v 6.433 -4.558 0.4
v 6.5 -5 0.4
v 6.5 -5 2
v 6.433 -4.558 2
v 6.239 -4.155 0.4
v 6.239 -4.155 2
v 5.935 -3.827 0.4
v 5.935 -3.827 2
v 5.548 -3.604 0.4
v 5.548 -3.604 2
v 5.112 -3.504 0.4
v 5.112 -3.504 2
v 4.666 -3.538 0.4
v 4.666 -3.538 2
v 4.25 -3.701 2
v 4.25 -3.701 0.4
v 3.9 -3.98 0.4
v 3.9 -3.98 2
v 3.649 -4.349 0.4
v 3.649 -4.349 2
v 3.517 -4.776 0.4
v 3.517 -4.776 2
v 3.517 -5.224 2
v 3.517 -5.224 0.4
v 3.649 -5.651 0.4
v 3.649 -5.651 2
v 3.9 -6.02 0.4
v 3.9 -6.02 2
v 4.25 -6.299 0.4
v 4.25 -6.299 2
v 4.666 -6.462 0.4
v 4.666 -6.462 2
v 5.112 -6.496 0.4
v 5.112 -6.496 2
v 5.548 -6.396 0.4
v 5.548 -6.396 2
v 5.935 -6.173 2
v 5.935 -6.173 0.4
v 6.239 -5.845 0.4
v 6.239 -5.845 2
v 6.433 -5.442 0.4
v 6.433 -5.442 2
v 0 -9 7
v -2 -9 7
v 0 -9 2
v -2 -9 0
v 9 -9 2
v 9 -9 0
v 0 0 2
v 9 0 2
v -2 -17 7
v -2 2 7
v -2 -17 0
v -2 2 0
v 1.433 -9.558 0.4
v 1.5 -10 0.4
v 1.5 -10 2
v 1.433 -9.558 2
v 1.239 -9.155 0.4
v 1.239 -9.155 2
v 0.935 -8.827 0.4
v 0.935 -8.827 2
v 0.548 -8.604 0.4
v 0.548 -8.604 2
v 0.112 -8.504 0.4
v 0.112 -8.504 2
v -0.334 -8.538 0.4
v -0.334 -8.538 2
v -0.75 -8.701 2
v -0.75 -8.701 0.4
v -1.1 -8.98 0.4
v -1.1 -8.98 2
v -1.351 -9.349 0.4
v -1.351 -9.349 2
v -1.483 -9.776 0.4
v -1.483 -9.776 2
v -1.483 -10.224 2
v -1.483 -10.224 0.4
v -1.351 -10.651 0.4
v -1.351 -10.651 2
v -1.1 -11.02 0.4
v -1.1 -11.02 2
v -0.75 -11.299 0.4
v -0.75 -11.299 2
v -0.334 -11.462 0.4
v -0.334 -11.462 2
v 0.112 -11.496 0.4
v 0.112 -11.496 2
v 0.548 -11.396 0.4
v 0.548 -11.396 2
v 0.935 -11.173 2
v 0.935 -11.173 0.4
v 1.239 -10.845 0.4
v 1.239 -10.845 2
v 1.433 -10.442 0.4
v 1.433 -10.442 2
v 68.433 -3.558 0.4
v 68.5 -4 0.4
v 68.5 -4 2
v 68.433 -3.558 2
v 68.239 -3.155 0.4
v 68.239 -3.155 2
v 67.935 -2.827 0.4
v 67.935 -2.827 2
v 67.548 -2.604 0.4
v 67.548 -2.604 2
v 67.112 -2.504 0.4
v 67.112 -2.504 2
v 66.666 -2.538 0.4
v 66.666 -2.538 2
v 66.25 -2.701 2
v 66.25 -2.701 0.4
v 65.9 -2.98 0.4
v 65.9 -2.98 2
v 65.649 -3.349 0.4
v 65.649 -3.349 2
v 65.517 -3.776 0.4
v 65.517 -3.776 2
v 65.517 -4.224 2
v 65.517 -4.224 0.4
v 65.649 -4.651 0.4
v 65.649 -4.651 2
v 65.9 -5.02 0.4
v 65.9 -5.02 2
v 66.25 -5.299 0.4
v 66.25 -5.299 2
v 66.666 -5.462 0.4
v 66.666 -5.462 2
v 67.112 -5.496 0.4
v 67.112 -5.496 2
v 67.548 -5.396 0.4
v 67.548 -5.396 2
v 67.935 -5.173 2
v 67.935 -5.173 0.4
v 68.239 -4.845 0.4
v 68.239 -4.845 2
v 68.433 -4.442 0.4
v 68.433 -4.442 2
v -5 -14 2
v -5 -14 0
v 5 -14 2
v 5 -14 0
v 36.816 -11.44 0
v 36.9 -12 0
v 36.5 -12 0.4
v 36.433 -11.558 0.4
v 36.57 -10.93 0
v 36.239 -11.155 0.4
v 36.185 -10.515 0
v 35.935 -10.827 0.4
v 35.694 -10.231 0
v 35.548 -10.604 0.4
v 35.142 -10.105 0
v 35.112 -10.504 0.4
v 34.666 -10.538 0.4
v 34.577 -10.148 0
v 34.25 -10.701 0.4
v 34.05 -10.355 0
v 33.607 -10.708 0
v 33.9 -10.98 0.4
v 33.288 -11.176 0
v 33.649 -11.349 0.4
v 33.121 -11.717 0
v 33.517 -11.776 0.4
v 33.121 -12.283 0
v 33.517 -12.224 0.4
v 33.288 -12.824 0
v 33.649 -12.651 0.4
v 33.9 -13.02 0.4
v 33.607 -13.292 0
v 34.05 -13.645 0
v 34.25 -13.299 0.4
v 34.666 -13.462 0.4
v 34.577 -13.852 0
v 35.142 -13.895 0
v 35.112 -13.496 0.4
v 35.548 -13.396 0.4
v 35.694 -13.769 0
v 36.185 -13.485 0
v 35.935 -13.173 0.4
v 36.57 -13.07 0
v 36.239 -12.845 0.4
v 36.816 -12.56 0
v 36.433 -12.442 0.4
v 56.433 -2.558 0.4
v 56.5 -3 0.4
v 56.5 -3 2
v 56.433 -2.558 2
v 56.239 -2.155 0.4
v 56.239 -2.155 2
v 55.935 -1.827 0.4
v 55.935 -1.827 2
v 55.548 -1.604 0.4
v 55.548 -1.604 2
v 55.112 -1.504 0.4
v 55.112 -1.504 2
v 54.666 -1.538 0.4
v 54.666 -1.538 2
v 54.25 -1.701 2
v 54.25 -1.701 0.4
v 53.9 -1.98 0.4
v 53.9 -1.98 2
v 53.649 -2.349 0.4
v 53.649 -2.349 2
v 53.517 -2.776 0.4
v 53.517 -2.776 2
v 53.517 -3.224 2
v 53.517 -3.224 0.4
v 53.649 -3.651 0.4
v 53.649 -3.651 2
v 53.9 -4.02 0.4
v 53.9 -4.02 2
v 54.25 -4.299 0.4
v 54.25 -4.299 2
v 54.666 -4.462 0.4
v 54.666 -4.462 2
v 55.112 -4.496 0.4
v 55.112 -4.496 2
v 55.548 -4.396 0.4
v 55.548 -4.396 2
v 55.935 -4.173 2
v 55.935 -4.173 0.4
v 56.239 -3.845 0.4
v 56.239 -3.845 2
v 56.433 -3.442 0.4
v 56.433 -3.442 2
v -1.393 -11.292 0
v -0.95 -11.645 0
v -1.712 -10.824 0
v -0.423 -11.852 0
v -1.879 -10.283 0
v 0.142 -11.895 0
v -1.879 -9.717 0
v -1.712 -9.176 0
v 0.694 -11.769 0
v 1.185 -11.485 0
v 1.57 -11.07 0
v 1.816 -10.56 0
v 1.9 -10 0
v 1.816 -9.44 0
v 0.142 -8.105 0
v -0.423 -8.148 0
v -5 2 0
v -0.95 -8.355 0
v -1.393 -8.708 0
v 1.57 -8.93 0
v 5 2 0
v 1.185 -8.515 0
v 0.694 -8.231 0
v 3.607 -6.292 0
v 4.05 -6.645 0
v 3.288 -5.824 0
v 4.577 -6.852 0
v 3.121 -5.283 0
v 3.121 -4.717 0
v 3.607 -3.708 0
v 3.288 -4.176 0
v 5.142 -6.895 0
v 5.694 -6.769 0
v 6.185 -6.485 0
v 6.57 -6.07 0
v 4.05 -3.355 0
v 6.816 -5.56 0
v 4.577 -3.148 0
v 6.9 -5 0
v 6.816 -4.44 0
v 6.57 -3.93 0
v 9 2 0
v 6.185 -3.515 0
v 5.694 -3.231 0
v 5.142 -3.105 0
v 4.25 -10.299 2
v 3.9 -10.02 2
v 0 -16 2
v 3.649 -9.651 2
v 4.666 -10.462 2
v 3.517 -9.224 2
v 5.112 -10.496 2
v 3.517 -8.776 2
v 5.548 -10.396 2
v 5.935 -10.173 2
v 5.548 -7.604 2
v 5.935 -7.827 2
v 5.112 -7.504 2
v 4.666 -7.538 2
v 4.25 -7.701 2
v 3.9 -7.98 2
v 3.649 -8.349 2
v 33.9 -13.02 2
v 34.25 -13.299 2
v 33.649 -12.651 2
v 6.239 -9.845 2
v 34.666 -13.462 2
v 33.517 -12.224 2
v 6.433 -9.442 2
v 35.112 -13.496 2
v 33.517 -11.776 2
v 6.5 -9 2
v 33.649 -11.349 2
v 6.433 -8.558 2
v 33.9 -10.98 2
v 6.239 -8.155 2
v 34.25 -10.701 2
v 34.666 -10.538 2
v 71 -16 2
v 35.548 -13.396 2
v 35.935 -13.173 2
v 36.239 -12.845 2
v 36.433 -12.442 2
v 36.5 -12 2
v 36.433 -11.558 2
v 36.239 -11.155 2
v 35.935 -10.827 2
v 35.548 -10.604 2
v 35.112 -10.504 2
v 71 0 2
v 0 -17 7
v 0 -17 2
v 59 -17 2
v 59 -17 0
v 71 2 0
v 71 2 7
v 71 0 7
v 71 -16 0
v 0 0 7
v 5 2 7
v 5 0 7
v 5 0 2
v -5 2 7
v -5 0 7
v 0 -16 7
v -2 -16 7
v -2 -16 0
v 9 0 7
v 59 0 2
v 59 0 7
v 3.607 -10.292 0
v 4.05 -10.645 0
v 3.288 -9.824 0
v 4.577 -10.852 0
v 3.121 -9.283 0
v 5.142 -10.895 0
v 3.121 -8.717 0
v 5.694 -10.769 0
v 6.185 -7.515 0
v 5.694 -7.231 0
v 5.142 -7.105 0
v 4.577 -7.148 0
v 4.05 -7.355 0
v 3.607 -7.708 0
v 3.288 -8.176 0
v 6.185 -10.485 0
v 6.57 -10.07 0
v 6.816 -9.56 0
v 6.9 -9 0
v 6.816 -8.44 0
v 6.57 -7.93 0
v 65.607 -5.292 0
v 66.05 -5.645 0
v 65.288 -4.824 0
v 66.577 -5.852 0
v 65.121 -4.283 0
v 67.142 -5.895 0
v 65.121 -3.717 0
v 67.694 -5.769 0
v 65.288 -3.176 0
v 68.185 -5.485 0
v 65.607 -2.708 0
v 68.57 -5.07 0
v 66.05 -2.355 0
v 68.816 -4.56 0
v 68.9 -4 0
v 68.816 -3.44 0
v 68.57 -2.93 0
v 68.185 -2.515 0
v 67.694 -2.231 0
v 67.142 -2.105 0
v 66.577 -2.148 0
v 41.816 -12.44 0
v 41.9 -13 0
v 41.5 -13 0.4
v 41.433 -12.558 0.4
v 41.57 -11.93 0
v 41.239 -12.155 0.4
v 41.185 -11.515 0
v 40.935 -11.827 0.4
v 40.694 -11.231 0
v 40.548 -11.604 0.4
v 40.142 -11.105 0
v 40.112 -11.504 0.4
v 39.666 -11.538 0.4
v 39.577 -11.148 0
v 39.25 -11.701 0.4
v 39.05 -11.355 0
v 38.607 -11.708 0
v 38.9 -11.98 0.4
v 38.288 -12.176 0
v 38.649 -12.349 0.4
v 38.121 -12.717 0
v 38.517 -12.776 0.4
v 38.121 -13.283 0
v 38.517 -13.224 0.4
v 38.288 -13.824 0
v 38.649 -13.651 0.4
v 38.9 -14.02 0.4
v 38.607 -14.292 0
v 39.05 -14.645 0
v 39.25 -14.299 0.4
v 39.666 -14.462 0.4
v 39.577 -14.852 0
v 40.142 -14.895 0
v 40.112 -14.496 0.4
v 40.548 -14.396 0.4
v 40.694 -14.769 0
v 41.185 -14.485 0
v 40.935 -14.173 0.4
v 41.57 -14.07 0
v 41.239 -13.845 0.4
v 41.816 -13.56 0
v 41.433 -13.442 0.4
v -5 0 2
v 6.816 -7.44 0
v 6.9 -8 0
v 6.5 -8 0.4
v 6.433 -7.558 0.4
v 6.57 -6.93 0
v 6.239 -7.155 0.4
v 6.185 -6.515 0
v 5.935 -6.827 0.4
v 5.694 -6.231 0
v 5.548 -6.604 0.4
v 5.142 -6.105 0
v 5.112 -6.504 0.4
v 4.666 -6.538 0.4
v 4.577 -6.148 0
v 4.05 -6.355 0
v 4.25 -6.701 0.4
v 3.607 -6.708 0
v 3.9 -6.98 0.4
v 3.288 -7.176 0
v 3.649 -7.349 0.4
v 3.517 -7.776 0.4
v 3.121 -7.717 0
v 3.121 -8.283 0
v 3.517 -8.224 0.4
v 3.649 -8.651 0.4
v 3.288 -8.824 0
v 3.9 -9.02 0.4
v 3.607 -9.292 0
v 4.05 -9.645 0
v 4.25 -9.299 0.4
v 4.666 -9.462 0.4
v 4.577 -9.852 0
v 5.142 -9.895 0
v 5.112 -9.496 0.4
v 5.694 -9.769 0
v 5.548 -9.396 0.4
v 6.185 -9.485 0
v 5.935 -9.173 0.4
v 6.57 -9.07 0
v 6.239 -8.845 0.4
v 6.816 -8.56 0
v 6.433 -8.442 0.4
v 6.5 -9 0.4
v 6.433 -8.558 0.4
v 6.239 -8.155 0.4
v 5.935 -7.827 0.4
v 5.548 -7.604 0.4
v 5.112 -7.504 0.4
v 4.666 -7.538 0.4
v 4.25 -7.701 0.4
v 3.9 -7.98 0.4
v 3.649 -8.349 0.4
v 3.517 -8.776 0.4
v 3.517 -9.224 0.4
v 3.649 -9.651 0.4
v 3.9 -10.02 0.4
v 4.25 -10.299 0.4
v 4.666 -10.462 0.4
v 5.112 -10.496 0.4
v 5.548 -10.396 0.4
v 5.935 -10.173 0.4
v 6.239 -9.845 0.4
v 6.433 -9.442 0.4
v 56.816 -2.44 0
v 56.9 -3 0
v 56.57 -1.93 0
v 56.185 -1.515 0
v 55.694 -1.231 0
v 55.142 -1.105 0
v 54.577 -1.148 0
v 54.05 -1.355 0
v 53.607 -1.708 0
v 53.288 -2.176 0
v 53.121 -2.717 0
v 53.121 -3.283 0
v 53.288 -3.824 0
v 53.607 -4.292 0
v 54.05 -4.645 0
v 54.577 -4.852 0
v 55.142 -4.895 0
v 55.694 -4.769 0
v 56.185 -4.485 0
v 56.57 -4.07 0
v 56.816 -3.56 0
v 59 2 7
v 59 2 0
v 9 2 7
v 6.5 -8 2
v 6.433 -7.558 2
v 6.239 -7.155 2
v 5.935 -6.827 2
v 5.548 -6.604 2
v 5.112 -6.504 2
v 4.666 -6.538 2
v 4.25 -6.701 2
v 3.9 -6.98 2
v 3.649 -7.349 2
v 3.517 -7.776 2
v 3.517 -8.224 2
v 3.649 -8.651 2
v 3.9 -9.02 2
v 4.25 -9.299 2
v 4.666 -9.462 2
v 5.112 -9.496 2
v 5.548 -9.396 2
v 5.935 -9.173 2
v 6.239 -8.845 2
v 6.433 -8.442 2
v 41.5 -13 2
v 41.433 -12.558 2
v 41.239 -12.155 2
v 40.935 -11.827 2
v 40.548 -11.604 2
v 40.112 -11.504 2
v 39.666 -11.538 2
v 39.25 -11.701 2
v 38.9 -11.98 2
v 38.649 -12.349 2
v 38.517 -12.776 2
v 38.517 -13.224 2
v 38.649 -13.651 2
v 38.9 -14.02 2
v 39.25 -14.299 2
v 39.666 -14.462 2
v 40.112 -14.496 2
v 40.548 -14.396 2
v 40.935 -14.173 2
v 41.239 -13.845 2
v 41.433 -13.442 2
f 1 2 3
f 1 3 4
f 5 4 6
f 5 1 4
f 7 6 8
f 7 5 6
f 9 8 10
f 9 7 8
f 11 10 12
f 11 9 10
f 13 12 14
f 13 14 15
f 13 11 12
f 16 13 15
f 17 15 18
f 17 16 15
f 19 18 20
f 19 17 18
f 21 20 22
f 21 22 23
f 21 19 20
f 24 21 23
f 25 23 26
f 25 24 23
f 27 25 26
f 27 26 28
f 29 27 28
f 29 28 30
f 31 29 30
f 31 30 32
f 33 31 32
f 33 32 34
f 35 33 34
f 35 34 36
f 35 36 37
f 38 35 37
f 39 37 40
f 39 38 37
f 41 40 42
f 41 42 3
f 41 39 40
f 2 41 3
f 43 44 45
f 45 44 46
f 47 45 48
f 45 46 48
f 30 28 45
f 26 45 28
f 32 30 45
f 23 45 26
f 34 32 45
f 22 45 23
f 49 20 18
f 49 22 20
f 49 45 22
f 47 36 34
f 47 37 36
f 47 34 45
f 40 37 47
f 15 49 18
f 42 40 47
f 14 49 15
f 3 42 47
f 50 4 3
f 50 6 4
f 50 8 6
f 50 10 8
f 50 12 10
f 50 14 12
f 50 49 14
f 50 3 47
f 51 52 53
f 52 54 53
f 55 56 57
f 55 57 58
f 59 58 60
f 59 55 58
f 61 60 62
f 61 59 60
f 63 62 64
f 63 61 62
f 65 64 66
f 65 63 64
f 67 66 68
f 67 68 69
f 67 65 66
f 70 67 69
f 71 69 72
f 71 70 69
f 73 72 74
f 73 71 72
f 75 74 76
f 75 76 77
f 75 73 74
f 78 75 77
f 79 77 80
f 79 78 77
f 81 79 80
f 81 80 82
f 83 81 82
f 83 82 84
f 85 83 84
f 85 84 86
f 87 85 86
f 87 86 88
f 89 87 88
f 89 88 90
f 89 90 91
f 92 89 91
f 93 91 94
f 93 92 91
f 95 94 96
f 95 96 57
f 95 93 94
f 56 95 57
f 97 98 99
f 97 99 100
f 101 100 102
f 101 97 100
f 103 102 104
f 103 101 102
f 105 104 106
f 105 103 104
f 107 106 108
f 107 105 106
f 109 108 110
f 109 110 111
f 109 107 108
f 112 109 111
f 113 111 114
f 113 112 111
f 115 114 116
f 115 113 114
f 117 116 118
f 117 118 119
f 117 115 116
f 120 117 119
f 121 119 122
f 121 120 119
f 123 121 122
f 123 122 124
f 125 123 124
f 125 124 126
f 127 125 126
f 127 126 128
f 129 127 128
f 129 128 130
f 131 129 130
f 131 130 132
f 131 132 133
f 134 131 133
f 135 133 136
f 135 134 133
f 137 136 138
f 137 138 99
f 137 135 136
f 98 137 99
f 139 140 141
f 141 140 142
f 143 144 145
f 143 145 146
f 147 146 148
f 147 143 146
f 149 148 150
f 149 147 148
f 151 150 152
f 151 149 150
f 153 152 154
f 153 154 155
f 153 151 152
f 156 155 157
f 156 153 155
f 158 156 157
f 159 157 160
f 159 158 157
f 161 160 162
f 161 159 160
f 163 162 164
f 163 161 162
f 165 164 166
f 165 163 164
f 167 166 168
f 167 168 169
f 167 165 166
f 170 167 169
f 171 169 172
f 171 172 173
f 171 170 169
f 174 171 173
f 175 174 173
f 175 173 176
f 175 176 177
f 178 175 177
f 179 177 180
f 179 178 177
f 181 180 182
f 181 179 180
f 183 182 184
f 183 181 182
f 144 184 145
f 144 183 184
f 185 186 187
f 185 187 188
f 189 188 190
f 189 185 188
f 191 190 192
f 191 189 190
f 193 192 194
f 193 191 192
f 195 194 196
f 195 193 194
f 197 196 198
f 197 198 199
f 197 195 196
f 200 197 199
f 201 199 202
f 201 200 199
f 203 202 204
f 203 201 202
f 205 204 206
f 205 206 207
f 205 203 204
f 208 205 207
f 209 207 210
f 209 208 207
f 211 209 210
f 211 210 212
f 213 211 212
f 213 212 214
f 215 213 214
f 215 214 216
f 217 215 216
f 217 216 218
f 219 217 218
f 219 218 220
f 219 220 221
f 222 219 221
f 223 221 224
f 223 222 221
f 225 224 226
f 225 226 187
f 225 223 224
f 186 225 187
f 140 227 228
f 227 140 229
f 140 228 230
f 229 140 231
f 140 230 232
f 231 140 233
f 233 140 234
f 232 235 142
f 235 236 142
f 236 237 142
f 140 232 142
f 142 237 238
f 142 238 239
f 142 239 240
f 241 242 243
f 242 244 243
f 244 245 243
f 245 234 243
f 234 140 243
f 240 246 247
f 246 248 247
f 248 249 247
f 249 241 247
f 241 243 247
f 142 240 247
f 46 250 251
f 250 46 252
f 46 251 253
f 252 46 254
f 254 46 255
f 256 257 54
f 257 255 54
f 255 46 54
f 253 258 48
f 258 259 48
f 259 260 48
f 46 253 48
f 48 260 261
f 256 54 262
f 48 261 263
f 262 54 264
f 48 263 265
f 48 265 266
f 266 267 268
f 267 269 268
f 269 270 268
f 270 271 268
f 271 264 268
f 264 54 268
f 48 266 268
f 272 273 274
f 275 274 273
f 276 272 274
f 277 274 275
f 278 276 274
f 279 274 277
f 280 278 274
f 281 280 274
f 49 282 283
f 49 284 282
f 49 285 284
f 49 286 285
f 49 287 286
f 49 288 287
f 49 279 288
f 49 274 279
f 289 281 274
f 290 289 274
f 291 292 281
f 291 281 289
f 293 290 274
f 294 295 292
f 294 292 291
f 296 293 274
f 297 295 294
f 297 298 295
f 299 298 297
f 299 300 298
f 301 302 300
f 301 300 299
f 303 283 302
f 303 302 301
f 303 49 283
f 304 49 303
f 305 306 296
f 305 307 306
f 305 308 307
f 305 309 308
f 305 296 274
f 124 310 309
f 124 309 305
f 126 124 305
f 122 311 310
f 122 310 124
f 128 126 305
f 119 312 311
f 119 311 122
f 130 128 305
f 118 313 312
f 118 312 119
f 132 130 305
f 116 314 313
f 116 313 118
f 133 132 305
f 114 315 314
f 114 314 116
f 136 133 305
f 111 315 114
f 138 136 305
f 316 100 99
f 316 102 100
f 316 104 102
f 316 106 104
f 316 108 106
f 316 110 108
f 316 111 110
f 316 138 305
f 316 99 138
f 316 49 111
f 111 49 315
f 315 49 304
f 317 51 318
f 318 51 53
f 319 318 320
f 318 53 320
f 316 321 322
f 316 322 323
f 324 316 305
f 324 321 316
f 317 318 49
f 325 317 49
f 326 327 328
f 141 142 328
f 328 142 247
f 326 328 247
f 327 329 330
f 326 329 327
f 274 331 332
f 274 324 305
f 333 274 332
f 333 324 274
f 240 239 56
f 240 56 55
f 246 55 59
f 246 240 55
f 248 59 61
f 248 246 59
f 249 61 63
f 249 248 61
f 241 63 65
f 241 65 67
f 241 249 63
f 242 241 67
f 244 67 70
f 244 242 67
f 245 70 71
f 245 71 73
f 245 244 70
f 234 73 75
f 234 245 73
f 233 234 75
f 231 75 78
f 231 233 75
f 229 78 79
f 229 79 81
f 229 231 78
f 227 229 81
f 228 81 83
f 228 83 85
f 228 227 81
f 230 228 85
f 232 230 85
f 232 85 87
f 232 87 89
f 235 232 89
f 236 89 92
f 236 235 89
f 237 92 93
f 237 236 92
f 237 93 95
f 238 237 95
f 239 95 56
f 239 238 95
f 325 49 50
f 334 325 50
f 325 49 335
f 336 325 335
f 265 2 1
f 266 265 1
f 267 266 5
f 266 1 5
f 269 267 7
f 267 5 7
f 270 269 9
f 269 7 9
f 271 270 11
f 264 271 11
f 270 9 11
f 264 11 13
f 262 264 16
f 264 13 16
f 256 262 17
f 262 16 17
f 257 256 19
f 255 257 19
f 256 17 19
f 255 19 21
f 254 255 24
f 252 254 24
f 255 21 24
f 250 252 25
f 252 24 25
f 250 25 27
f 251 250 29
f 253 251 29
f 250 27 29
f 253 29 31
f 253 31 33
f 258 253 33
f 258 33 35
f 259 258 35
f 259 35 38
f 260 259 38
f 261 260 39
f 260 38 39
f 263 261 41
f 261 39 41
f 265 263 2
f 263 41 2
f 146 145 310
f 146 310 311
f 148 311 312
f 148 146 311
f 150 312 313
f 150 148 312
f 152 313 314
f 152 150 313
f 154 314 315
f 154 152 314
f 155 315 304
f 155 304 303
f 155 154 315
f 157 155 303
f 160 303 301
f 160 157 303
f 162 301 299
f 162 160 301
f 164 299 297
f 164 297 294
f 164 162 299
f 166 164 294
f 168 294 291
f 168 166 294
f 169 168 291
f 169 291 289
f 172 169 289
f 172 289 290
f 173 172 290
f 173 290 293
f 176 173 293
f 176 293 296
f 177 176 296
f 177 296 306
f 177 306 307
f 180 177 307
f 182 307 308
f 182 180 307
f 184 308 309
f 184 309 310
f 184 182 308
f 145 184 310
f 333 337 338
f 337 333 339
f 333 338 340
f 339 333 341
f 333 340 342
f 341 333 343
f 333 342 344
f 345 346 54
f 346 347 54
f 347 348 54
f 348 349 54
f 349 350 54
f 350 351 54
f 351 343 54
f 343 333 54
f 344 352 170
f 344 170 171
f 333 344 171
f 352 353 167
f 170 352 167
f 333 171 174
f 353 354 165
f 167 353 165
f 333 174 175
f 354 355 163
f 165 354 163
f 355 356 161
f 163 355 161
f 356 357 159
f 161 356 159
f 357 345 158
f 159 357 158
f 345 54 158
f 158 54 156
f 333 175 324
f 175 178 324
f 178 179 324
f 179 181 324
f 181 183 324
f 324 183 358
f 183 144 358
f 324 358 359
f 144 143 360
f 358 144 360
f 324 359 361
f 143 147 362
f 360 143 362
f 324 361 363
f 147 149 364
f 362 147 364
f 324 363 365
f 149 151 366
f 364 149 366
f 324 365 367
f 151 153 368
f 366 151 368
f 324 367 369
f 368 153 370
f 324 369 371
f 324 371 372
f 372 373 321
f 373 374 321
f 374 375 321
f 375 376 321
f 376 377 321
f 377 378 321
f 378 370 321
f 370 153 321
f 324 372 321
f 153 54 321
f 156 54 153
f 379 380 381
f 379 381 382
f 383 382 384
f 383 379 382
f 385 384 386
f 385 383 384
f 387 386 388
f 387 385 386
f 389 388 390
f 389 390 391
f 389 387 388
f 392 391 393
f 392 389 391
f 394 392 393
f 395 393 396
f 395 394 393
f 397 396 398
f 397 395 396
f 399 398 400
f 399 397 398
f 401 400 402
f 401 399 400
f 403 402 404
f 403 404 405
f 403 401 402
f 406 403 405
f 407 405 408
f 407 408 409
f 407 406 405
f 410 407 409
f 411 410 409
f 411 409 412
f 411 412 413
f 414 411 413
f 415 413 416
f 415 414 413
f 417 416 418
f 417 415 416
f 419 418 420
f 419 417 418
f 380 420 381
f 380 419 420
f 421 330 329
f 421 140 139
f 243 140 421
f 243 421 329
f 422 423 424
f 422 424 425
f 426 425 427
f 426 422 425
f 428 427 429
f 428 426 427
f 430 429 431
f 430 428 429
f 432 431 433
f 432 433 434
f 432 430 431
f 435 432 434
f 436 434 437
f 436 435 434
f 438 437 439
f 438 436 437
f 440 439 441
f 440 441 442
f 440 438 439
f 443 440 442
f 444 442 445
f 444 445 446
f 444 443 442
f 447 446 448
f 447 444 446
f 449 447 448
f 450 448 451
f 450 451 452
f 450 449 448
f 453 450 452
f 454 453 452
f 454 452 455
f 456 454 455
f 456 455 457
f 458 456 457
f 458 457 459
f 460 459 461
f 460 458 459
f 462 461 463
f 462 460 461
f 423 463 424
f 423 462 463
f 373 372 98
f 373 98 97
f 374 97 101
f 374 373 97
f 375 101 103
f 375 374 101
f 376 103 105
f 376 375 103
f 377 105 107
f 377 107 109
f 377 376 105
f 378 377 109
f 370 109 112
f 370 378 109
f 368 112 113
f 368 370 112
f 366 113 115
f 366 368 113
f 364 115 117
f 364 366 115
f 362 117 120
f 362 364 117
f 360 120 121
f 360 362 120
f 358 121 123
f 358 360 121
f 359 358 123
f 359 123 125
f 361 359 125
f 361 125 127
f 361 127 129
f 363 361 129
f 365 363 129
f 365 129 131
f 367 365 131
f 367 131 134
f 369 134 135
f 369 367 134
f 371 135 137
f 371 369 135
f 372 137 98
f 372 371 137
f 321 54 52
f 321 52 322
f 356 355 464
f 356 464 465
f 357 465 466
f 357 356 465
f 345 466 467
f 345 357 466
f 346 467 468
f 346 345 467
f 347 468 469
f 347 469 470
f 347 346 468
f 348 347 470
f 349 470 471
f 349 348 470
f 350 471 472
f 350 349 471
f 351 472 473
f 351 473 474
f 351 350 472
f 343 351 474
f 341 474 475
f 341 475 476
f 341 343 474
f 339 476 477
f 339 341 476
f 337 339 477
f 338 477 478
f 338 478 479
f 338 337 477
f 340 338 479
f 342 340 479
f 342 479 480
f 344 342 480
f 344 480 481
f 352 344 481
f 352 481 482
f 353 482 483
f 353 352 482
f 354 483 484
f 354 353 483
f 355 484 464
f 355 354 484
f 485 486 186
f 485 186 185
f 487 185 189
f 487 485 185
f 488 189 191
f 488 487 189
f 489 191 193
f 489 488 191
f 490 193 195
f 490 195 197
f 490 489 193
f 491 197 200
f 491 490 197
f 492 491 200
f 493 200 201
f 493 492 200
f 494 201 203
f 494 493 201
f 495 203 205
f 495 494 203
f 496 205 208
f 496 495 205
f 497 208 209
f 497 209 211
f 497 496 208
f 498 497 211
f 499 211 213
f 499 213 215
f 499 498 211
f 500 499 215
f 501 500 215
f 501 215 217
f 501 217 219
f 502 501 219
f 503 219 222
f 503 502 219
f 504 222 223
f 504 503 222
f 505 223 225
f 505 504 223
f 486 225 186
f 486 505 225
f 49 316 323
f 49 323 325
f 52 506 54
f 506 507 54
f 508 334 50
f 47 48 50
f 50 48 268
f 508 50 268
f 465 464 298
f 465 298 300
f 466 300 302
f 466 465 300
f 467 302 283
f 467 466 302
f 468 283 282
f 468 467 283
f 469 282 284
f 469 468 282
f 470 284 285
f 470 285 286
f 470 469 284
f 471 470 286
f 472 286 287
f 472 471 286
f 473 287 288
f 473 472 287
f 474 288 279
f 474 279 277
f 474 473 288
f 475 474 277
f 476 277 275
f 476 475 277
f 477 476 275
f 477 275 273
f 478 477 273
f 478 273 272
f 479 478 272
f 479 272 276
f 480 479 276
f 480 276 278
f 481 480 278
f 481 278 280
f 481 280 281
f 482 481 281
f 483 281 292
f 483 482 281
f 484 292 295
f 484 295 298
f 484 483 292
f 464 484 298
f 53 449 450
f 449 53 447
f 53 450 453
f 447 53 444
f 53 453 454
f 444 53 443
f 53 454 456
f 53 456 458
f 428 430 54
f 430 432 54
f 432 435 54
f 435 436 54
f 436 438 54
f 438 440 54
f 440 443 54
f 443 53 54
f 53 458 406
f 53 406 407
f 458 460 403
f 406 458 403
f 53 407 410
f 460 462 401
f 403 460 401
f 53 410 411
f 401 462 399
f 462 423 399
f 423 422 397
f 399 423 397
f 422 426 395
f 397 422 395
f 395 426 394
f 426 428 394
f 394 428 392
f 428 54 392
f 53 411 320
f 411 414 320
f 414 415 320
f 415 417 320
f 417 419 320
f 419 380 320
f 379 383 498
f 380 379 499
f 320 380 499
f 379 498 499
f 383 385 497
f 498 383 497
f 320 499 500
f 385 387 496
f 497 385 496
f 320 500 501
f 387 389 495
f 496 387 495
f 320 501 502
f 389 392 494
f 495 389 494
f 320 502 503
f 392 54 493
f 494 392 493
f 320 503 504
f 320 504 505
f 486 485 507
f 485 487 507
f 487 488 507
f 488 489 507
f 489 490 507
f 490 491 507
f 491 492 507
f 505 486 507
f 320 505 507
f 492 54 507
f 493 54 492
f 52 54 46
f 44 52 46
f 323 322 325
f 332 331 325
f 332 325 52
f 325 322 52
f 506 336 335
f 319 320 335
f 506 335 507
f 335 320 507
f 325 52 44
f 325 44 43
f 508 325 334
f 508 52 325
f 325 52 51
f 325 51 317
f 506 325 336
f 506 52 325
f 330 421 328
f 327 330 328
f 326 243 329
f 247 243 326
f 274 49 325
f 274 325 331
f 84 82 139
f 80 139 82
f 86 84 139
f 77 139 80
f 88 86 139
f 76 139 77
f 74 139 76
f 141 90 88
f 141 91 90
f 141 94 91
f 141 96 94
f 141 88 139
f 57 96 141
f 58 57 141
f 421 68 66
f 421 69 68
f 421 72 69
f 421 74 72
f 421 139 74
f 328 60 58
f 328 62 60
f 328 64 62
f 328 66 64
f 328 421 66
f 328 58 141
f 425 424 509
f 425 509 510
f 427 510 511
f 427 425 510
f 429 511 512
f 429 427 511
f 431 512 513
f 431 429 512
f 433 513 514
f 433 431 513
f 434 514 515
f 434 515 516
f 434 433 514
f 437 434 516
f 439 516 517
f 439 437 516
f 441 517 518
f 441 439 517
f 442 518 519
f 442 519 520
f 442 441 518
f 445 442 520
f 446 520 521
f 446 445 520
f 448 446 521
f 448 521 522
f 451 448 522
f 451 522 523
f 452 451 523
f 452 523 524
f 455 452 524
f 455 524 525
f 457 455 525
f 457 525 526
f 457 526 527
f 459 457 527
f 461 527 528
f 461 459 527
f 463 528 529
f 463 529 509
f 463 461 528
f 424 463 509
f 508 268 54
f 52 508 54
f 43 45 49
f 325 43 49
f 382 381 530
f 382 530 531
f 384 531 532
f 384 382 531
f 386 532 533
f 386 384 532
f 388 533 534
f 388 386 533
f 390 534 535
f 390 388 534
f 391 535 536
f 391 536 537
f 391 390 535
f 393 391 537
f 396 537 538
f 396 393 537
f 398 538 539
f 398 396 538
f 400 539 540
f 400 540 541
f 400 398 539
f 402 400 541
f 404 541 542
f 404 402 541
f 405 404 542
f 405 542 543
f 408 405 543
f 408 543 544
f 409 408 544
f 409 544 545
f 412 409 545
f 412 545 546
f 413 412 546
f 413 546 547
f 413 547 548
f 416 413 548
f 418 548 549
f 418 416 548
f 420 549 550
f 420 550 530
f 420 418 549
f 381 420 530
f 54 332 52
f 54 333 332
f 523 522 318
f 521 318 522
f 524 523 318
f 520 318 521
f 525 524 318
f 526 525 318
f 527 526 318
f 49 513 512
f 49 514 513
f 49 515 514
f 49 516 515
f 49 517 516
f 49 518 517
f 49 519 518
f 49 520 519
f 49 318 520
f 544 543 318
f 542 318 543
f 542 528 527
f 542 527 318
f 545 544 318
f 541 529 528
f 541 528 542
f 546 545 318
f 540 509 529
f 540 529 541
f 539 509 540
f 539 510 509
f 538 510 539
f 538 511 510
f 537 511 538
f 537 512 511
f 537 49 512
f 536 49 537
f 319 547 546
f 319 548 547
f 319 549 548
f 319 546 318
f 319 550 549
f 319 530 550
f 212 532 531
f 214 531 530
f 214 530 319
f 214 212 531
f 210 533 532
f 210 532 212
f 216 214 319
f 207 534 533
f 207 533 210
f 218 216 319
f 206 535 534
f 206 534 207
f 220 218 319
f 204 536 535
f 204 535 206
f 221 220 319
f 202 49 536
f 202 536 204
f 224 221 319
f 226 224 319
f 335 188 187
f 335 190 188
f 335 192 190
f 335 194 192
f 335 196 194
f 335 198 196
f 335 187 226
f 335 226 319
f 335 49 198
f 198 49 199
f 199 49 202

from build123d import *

# Parameters (mm, degrees)
SKETCH_W        = 61
SKETCH_H        = 19
SKETCH_R        = 1.5
PAD_DEPTH       = 2
PAD001_DEPTH    = 5
CHAMFER003_SIZE = 0.4
SKETCH002_W     = 73
SKETCH002_H     = 18
SKETCH002_R     = 1.5
PAD002_DEPTH    = 2
PAD003_DEPTH    = 5
CHAMFER002_SIZE = 0.4
SKETCH004_W     = 11
SKETCH004_H     = 11
SKETCH004_R     = 1.5
PAD004_DEPTH    = 2
PAD005_DEPTH    = 5
CHAMFER001_SIZE = 0.4
SKETCH006_W     = 10
SKETCH006_H     = 16
SKETCH006_R     = 1.5
PAD006_DEPTH    = 2
SKETCH007_W     = 10
SKETCH007_H     = 2
PAD007_DEPTH    = 5
CHAMFER_SIZE    = 0.4


with BuildPart() as f_180_glass_bed_top_hole_templatre:
    # Sketch → Pad (new body)
    with BuildSketch(Plane.XY):
        with Locations((28.5, -7.5)):
            Rectangle(SKETCH_W, SKETCH_H)
        with Locations((5, -8)):
            Circle(SKETCH_R, mode=Mode.SUBTRACT)
        with Locations((40, -13)):
            Circle(SKETCH_R, mode=Mode.SUBTRACT)
        with Locations((55, -3)):
            Circle(SKETCH_R, mode=Mode.SUBTRACT)
    extrude(amount=PAD_DEPTH)

    # Sketch001 (on Face9 of Pad) → Pad001 (join)
    with BuildSketch(Plane.XY.offset(2)):
        Polygon((59, 0), (59, 2), (-2, 2), (-2, -17), (0, -17), (0, 0), align=None)
    extrude(amount=PAD001_DEPTH)

    # Chamfer003
    chamfer003_edges = [f_180_glass_bed_top_hole_templatre.edges().sort_by_distance(p)[0] for p in [
        (3.5, -8, 0),
        (38.5, -13, 0),
        (53.5, -3, 0),
    ]]
    chamfer(chamfer003_edges, length=CHAMFER003_SIZE)


with BuildPart() as f_250_glass_bed_top_hole_templatre:
    # Sketch002 → Pad002 (new body)
    with BuildSketch(Plane.XY):
        with Locations((34.5, -7)):
            Rectangle(SKETCH002_W, SKETCH002_H)
        with Locations((5, -9)):
            Circle(SKETCH002_R, mode=Mode.SUBTRACT)
        with Locations((35, -12)):
            Circle(SKETCH002_R, mode=Mode.SUBTRACT)
        with Locations((67, -4)):
            Circle(SKETCH002_R, mode=Mode.SUBTRACT)
    extrude(amount=PAD002_DEPTH)

    # Sketch003 (on Face9 of Pad002) → Pad003 (join)
    with BuildSketch(Plane.XY.offset(2)):
        Polygon((-2, -16), (-2, 2), (71, 2), (71, 0), (0, 0), (0, -16), align=None)
    extrude(amount=PAD003_DEPTH)

    # Chamfer002
    chamfer002_edges = [f_250_glass_bed_top_hole_templatre.edges().sort_by_distance(p)[0] for p in [
        (3.5, -9, 0),
        (33.5, -12, 0),
        (65.5, -4, 0),
    ]]
    chamfer(chamfer002_edges, length=CHAMFER002_SIZE)


with BuildPart() as corner:
    # Sketch004 → Pad004 (new body)
    with BuildSketch(Plane.XY):
        with Locations((3.5, -3.5)):
            Rectangle(SKETCH004_W, SKETCH004_H)
        with Locations((5, -5)):
            Circle(SKETCH004_R, mode=Mode.SUBTRACT)
    extrude(amount=PAD004_DEPTH)

    # Sketch005 (on Face7 of Pad004) → Pad005 (join)
    with BuildSketch(Plane.XY.offset(2)):
        Polygon((-2, 2), (-2, -9), (0, -9), (0, 0), (9, 0), (9, 2), align=None)
    extrude(amount=PAD005_DEPTH)

    # Chamfer001
    chamfer001_edges = [corner.edges().sort_by_distance(p)[0] for p in [
        (3.5, -5, 0),
    ]]
    chamfer(chamfer001_edges, length=CHAMFER001_SIZE)


with BuildPart() as center:
    # Sketch006 → Pad006 (new body)
    with BuildSketch(Plane.XY):
        with Locations((0, -6)):
            Rectangle(SKETCH006_W, SKETCH006_H)
        with Locations((0, -10)):
            Circle(SKETCH006_R, mode=Mode.SUBTRACT)
    extrude(amount=PAD006_DEPTH)

    # Sketch007 (on Face7 of Pad006) → Pad007 (join)
    with BuildSketch(Plane.XY.offset(2)):
        with Locations((0, 1)):
            Rectangle(SKETCH007_W, SKETCH007_H)
    extrude(amount=PAD007_DEPTH)

    # Chamfer
    chamfer_edges = [center.edges().sort_by_distance(p)[0] for p in [
        (-1.5, -10, 0),
    ]]
    chamfer(chamfer_edges, length=CHAMFER_SIZE)


solid = Compound([f_180_glass_bed_top_hole_templatre.part, f_250_glass_bed_top_hole_templatre.part, corner.part, center.part])
